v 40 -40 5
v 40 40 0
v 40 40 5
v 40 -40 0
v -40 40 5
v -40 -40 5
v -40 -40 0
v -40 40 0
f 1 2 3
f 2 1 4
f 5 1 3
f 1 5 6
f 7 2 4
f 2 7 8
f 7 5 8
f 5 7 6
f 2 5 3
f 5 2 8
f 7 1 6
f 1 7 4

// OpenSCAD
difference() {
	translate([-40,-40,0]) cube([80,80,5], center=false);
	linear_extrude(
		file="tmp.dxf",
		layer="0",
		height=5,
		scale=15,
		origin=[2.75,2.75]
	);
}
